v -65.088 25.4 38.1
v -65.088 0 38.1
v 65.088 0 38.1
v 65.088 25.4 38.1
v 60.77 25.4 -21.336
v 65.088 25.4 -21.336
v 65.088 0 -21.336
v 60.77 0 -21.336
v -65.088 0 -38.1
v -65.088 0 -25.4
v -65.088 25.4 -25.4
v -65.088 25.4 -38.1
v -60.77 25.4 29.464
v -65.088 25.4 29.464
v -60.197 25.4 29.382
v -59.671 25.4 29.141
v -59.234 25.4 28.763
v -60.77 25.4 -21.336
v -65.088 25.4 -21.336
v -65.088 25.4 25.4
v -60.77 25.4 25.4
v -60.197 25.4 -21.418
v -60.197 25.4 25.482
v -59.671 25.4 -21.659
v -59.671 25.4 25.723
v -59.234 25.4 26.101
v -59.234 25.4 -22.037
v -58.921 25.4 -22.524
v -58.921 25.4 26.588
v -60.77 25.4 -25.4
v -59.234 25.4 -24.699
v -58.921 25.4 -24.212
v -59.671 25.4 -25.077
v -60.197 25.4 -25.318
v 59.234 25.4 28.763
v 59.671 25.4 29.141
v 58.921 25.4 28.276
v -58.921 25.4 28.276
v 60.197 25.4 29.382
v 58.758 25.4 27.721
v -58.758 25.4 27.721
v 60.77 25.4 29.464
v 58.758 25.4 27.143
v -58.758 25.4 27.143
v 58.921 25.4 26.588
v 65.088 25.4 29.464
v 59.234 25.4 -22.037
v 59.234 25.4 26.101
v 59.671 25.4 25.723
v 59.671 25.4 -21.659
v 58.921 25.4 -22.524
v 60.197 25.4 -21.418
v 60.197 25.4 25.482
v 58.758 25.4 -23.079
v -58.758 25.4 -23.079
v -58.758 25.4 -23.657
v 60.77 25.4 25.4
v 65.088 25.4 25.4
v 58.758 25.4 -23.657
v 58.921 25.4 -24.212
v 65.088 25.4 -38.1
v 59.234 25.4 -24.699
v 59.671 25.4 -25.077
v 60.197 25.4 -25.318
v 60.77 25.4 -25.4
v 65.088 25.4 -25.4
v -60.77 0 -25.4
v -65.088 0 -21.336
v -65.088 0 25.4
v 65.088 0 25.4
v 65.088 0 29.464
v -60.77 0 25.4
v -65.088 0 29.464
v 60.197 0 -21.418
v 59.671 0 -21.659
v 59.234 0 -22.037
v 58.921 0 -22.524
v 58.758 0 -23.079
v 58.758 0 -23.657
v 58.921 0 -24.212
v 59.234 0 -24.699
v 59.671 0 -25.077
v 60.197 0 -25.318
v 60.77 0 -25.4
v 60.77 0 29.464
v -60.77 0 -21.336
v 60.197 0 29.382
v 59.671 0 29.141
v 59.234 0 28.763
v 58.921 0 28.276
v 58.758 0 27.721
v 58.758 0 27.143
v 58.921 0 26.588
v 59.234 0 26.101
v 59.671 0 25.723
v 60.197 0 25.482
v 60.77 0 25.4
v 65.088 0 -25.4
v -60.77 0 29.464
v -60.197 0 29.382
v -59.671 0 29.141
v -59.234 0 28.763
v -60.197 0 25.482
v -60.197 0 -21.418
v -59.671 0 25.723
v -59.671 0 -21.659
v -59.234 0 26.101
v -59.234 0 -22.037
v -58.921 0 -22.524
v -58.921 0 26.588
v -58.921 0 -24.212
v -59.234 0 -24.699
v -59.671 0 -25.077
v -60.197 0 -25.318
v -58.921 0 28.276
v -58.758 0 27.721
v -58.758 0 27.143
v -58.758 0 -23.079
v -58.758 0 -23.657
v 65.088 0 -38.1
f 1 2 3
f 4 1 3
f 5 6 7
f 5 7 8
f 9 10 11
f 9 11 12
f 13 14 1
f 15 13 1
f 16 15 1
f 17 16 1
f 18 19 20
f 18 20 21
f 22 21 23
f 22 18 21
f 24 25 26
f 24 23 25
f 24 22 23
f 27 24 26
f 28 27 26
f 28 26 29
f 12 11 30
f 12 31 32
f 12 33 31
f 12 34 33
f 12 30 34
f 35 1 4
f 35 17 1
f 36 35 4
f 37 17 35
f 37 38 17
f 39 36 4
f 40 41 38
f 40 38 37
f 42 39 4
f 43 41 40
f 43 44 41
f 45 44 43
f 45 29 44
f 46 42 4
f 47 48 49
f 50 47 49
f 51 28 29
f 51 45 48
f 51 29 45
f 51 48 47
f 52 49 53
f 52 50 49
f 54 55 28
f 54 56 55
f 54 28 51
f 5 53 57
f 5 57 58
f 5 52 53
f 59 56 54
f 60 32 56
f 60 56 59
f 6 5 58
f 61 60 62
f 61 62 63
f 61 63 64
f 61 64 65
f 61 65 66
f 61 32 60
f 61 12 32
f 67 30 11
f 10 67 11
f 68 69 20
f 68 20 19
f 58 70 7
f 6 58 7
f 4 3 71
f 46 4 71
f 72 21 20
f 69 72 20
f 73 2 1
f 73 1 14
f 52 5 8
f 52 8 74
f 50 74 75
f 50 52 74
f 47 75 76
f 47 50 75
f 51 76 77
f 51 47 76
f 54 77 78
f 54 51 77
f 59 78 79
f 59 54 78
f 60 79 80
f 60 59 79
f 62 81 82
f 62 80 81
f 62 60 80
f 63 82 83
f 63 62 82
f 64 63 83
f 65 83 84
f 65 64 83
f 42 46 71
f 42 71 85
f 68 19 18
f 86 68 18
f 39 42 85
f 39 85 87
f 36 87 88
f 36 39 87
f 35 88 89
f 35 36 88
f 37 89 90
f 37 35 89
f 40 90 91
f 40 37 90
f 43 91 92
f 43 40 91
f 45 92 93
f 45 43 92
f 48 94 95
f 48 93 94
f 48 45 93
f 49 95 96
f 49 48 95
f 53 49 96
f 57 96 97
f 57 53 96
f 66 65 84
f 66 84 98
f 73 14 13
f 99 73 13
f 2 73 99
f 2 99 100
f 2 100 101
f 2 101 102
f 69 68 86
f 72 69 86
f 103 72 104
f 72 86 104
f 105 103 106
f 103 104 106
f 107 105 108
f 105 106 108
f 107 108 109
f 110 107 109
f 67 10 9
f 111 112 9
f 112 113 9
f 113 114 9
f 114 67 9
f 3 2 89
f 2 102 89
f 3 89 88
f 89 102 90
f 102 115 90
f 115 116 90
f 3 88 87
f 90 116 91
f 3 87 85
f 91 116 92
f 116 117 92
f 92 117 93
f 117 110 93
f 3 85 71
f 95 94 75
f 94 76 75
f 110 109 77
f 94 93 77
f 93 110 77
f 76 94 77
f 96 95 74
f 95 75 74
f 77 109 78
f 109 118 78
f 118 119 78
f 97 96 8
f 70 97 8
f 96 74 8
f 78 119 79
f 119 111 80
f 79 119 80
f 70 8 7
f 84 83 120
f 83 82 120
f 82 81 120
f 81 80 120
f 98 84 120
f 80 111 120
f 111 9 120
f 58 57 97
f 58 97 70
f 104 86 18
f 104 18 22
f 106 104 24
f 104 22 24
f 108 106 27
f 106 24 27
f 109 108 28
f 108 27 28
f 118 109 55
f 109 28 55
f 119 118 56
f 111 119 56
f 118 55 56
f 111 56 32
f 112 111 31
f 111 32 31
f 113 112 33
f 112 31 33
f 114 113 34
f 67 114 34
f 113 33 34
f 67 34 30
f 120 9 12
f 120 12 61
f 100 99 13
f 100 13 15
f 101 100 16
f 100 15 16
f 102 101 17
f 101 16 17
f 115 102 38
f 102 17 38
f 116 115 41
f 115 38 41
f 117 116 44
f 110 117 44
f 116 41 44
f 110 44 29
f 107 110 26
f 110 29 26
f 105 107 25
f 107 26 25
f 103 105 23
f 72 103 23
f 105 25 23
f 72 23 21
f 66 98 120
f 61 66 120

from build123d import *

# Parameters (mm, degrees)
SKETCH1_W           = 130.175
SKETCH1_H           = 76.2
BOSS_EXTRUDE1_DEPTH = 25.4
CUT_EXTRUDE1_DEPTH  = 26.4


with BuildPart() as part:
    # Sketch1 → Boss-Extrude1 (new body)
    with BuildSketch(Plane(origin=(0, 0, 0), x_dir=(1, 0, 0), z_dir=(0, 1, 0))):
        Rectangle(SKETCH1_W, SKETCH1_H)
    extrude(amount=BOSS_EXTRUDE1_DEPTH)

    # Sketch2 → Cut-Extrude1 (cut, through all)
    with BuildSketch(Plane(origin=(0, 25.4, 0), x_dir=(1, 0, 0), z_dir=(0, 1, 0))):
        with BuildLine():
            Line((-60.7695, 25.4), (-65.0875, 25.4))
            Line((-65.0875, 25.4), (-65.0875, 21.336))
            Line((-65.0875, 21.336), (-60.7695, 21.336))
            ThreePointArc((-60.7695, 21.336), (-58.7375, 23.368), (-60.7695, 25.4))
        make_face()
        with BuildLine():
            Line((-60.7695, -25.4), (-65.0875, -25.4))
            Line((-65.0875, -25.4), (-65.0875, -29.464))
            Line((-65.0875, -29.464), (-60.7695, -29.464))
            ThreePointArc((-60.7695, -29.464), (-58.7375, -27.432), (-60.7695, -25.4))
        make_face()
    cut_extrude1 = extrude(amount=-CUT_EXTRUDE1_DEPTH, mode=Mode.SUBTRACT)

    # Mirror2: Cut-Extrude1 across plane
    add(cut_extrude1.mirror(Plane(origin=(0, 0, 0), x_dir=(0, 0, 1), z_dir=(1, 0, 0))), mode=Mode.SUBTRACT)


solid = part.part
